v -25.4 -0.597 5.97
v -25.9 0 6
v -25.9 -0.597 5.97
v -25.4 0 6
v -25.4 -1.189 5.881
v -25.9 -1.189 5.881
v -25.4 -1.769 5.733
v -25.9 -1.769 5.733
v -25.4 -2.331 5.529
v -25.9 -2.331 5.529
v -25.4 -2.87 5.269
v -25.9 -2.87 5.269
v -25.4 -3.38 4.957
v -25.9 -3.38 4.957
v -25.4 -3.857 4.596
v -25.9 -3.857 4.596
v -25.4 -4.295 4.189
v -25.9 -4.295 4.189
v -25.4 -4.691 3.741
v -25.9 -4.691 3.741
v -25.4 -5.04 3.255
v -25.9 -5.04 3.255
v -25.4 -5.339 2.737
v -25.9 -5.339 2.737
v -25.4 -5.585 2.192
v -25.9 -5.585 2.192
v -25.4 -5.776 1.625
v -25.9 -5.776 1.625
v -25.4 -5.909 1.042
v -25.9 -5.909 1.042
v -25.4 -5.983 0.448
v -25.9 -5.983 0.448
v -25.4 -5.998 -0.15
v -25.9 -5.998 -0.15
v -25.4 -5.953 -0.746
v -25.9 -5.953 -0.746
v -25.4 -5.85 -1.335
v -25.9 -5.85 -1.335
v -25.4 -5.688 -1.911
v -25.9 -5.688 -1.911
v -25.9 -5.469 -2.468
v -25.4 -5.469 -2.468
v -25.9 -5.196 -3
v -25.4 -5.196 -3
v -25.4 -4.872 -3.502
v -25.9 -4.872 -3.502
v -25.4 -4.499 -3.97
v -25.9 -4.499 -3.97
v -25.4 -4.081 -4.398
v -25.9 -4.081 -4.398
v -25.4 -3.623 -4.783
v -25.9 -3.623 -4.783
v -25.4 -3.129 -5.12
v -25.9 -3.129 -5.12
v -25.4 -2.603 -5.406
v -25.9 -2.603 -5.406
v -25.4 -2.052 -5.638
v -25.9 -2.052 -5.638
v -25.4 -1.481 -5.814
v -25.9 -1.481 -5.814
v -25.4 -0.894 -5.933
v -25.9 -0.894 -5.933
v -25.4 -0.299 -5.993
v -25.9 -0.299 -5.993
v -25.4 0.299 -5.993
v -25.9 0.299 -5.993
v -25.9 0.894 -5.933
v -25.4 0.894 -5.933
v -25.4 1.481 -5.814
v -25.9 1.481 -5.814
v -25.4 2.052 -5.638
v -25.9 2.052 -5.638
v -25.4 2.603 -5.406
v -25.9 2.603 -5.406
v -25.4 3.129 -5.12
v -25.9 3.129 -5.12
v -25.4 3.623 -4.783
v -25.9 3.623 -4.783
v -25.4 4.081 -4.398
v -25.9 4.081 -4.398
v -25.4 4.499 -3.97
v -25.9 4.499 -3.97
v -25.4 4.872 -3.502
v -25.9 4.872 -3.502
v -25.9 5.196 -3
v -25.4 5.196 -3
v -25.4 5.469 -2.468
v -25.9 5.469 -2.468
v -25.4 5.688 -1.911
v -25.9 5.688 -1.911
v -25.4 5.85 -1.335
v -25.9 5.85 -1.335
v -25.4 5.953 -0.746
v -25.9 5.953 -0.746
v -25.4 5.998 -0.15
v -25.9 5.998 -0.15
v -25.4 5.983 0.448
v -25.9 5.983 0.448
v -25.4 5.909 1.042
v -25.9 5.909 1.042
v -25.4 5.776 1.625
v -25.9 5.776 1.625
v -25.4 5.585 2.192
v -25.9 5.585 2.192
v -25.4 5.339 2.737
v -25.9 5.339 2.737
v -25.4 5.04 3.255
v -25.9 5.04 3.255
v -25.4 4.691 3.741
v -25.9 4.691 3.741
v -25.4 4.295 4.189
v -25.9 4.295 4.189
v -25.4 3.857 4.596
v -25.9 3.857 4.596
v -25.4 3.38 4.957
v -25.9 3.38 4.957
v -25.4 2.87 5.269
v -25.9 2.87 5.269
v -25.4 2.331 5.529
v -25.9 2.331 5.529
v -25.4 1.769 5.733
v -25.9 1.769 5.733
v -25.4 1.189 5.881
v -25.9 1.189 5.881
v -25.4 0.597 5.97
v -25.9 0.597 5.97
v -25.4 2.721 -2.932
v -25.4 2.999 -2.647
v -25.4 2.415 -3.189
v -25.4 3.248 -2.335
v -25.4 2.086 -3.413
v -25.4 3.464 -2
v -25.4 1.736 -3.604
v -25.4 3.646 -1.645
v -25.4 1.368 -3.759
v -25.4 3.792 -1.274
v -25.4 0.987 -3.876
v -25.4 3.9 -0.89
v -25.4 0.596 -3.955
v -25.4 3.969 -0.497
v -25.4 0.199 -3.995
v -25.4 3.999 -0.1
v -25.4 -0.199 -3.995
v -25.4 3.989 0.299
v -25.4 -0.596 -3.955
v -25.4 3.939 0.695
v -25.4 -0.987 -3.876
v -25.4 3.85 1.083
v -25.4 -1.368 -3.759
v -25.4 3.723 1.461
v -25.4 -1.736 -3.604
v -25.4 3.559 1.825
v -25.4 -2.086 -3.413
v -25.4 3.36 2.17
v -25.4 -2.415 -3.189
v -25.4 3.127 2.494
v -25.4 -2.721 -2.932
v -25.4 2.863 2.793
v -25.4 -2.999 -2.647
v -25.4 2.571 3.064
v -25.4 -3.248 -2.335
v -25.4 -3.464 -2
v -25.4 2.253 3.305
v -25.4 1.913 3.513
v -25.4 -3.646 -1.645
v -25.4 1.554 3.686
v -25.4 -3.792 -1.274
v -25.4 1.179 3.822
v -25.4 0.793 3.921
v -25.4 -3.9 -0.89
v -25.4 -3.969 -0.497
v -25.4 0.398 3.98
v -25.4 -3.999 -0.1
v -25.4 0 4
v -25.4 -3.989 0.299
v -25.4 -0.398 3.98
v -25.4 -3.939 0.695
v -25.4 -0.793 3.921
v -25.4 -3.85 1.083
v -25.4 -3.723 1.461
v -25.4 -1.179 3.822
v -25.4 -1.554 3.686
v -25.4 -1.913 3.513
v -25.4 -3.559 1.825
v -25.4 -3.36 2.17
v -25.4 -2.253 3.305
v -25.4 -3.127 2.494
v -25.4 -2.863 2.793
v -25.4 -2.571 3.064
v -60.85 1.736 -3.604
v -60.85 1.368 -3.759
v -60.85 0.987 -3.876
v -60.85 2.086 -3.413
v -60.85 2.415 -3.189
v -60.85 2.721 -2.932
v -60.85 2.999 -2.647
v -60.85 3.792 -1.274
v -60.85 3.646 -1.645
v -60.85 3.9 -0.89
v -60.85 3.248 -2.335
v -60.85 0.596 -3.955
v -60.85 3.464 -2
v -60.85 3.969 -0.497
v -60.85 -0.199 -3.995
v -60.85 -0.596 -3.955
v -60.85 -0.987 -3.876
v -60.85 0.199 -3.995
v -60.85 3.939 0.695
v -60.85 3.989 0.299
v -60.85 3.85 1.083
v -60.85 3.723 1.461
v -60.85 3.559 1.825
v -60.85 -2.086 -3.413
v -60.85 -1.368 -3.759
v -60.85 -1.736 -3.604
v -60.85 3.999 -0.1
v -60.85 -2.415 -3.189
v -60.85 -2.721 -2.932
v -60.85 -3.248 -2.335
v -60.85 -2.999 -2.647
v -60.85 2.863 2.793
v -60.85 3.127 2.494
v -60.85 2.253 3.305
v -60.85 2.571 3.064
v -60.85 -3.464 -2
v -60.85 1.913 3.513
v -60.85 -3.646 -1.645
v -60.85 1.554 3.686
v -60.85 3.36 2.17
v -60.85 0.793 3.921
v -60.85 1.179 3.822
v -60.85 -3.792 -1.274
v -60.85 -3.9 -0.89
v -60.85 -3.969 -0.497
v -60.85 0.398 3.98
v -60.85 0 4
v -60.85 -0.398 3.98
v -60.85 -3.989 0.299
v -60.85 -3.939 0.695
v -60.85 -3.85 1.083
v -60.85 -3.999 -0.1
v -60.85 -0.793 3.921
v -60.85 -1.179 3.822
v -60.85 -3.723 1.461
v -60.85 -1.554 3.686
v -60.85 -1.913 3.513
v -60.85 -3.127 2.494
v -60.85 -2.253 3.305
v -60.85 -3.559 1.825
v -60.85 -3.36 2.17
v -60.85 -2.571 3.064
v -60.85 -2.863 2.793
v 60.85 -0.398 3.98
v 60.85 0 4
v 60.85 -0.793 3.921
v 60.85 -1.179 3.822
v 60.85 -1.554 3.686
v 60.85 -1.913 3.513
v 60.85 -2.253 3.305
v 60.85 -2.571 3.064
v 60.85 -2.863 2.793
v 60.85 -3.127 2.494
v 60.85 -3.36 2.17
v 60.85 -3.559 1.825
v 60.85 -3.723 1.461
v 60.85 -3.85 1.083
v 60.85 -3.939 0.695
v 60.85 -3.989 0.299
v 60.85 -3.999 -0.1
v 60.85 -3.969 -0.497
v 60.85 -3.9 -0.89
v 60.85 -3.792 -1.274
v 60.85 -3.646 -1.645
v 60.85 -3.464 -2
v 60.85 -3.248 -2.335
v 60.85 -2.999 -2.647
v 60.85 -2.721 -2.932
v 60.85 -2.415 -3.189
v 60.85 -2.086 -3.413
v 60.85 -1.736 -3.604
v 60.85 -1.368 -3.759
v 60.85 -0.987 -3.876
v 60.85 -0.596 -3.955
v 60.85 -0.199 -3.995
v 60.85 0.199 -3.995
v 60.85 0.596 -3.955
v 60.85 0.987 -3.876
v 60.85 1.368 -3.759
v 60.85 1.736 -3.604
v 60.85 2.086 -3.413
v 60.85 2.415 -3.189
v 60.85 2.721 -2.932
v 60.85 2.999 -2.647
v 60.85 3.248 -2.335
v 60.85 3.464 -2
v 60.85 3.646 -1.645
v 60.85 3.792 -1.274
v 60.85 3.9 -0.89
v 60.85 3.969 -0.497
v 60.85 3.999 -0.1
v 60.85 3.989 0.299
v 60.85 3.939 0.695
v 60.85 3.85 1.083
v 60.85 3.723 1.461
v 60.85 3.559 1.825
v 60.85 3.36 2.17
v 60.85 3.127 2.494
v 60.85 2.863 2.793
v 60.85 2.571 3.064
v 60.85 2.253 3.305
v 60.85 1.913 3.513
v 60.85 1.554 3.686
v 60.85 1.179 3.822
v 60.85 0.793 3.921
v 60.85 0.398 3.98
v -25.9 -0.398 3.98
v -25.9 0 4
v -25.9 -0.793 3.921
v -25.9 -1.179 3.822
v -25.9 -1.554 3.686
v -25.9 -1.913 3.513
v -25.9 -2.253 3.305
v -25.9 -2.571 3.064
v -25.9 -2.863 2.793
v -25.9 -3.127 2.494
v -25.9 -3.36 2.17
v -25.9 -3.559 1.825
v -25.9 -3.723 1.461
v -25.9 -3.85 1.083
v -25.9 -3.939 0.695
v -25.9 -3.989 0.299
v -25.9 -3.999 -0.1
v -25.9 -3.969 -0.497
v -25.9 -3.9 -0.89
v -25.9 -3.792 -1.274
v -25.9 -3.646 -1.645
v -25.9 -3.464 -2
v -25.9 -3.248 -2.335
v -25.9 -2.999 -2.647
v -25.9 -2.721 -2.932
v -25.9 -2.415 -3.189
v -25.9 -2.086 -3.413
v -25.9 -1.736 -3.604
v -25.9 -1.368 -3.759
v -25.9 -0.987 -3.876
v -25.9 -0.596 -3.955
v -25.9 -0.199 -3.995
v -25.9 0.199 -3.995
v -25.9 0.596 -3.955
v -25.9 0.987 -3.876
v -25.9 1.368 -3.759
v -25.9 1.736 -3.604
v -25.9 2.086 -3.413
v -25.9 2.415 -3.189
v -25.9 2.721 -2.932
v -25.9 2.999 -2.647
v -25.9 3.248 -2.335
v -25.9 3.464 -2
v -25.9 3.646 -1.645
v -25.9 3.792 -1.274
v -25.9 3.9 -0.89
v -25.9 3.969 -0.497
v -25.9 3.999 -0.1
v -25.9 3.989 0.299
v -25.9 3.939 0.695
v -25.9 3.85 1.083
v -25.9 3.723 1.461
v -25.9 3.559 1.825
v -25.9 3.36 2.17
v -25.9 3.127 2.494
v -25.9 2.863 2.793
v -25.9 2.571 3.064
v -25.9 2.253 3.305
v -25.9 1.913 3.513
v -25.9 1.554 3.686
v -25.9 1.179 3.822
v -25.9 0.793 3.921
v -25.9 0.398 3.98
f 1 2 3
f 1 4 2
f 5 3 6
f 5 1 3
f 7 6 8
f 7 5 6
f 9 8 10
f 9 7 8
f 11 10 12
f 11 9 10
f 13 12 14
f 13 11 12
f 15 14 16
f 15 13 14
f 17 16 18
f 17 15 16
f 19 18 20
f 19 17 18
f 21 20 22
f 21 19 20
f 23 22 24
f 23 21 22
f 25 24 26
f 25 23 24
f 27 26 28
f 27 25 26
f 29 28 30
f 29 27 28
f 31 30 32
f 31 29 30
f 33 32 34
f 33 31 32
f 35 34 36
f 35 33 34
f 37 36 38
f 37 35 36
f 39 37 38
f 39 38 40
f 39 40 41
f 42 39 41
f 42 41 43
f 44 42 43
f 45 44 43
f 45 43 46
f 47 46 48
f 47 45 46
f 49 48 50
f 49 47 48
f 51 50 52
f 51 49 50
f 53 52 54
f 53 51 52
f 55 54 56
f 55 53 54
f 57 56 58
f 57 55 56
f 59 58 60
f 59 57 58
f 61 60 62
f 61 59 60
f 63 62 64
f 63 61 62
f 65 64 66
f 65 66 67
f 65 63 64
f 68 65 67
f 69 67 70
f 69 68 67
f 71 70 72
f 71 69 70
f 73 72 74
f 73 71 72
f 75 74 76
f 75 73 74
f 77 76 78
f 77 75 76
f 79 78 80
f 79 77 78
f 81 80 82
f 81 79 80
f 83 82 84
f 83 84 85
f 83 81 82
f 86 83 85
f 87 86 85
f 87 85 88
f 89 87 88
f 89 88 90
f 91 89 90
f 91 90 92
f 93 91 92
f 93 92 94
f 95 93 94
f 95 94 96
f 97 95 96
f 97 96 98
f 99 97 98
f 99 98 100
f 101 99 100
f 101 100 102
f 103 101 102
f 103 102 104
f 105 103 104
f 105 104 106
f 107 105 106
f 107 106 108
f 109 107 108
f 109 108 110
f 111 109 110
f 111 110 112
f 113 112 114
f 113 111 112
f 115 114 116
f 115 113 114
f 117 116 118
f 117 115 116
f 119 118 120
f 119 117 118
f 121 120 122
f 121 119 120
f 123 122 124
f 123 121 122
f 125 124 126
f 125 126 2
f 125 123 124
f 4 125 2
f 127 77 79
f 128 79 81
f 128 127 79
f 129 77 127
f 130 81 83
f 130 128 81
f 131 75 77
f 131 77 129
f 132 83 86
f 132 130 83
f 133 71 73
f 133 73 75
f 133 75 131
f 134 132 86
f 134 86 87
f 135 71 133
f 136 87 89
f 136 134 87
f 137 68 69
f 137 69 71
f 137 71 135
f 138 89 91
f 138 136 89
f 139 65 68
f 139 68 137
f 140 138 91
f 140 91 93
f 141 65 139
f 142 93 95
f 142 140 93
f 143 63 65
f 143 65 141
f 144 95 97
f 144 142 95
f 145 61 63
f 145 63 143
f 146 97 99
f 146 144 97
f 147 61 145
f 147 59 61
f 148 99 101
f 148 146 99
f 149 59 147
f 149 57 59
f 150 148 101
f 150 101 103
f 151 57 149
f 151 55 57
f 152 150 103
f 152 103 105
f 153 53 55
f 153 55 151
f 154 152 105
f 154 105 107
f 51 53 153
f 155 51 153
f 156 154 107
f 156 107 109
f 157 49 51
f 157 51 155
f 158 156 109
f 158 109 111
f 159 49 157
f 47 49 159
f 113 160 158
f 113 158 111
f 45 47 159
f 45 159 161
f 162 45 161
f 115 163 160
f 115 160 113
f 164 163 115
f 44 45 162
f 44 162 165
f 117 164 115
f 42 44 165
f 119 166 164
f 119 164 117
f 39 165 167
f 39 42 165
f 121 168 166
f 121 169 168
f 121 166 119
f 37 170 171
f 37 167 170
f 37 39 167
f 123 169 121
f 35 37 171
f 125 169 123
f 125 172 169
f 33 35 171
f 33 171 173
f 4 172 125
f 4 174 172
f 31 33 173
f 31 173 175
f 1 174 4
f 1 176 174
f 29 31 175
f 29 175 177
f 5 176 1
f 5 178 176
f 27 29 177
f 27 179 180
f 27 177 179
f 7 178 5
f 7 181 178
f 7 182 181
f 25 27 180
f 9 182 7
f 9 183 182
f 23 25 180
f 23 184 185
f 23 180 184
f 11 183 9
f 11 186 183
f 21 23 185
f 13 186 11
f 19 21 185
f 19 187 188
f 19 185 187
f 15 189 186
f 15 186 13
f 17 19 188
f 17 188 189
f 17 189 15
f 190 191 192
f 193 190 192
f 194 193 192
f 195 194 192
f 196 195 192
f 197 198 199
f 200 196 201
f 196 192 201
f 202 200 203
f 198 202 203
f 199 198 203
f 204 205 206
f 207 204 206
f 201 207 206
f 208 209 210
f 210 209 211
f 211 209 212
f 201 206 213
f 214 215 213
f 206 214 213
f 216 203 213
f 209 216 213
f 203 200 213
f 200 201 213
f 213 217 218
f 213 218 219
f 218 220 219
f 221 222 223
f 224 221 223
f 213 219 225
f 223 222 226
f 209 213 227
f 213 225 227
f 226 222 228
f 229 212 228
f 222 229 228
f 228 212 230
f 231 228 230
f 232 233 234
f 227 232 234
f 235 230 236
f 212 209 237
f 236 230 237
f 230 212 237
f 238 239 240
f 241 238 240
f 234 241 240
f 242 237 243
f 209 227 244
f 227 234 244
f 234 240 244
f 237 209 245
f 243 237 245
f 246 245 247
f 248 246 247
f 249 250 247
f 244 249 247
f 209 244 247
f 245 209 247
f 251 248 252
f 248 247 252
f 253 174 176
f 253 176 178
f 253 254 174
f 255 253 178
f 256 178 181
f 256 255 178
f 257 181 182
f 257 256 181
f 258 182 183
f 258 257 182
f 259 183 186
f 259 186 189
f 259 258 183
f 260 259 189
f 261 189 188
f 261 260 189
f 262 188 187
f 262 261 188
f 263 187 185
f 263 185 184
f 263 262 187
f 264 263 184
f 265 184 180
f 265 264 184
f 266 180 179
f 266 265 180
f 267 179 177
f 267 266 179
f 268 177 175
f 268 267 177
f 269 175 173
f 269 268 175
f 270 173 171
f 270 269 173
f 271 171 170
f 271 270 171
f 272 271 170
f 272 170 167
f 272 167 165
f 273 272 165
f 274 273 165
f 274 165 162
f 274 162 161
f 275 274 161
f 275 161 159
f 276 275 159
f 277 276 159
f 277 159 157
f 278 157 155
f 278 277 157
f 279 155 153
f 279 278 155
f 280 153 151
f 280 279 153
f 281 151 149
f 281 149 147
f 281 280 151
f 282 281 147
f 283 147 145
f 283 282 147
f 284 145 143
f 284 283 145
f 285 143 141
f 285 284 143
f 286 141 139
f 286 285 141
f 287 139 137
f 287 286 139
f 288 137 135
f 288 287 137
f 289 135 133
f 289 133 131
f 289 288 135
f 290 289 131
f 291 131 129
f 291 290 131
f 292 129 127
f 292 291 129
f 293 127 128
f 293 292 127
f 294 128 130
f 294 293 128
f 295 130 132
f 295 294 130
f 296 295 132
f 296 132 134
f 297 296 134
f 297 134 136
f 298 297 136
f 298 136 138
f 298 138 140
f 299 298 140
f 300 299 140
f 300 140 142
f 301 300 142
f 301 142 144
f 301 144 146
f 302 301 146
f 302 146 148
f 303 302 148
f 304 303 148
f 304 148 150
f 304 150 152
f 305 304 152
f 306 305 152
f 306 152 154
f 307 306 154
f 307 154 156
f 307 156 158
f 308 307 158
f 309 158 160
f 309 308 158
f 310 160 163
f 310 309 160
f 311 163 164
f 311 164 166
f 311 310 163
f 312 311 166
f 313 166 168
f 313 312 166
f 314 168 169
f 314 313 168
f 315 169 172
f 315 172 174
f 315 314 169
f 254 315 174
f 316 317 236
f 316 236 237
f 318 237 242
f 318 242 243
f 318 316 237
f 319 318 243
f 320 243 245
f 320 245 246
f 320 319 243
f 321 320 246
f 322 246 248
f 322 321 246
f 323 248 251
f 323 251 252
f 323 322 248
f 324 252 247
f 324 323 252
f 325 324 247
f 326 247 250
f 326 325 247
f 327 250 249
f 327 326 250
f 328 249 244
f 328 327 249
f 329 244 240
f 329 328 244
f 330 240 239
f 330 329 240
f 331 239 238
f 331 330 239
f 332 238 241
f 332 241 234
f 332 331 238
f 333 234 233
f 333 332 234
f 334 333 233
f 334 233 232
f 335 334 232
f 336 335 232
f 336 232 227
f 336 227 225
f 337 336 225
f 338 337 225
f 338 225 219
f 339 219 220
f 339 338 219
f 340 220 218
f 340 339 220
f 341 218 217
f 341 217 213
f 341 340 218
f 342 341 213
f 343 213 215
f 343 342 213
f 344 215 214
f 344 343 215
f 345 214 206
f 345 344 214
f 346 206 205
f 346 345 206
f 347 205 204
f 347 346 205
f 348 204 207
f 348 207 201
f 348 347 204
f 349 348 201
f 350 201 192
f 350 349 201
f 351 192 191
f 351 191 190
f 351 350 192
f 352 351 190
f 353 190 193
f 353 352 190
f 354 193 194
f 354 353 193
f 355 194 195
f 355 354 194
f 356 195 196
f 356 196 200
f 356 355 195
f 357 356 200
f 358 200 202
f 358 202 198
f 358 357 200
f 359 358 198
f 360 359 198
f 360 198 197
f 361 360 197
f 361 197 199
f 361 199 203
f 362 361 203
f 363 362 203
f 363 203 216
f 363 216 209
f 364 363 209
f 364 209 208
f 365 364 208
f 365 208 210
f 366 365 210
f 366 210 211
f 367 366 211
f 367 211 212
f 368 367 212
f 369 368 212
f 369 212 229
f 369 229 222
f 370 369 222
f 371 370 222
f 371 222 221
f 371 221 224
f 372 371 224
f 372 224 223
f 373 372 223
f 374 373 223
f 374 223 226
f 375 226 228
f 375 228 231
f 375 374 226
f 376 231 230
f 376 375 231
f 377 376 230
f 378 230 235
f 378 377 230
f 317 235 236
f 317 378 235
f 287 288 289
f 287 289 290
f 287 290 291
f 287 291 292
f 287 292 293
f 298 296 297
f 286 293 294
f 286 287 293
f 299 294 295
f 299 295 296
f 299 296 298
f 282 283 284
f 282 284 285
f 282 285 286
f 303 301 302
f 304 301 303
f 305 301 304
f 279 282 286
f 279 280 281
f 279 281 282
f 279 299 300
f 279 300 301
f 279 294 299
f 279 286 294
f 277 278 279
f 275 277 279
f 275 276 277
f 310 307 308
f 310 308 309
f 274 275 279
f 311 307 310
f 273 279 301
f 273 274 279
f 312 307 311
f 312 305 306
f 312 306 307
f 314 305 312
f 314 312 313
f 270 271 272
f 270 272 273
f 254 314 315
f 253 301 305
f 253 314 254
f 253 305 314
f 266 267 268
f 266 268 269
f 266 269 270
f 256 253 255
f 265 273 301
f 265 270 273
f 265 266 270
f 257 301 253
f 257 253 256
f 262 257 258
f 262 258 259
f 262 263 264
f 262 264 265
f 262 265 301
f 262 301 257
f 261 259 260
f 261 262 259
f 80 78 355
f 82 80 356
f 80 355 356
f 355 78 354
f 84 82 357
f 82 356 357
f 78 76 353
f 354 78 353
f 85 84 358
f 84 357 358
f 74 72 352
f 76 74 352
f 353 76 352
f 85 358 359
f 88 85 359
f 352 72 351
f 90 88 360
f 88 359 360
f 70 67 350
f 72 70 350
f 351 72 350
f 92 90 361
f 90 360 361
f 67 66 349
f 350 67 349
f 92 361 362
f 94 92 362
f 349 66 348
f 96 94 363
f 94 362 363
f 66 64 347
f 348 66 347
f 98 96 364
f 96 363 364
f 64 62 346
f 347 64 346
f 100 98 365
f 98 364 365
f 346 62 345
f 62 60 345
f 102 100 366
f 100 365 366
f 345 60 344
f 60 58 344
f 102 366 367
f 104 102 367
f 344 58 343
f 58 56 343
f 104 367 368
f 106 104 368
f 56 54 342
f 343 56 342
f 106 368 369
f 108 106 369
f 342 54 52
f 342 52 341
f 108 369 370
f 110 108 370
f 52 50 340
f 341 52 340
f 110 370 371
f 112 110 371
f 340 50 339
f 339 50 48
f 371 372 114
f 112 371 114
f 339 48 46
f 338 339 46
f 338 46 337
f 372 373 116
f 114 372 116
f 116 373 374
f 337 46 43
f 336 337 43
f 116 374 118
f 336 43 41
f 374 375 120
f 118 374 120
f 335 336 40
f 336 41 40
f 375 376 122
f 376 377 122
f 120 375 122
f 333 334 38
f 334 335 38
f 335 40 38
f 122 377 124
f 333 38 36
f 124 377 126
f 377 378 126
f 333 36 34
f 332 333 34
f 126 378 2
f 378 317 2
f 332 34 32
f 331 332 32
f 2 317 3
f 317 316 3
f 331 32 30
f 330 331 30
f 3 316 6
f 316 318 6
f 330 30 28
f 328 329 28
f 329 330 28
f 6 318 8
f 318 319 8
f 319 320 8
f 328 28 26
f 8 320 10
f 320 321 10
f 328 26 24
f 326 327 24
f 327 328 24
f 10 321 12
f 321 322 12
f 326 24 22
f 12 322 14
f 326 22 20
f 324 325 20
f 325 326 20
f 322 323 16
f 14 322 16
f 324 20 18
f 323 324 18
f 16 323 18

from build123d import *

# Parameters (mm, degrees)
ESBO_O1_W = 121.7
ESBO_O1_H = 4
ESBO_O2_W = 0.5
ESBO_O2_H = 6


with BuildPart() as part:
    # Esboço1 → Revolução2 (revolve)
    with BuildSketch(Plane.XY, mode=Mode.PRIVATE) as revolu_o2_sk:
        with Locations((0, -2)):
            Rectangle(ESBO_O1_W, ESBO_O1_H)
    revolve(revolu_o2_sk.sketch.rotate(Axis((-60.85, 0, 0), (1, 0, 0)), 270), axis=Axis((-60.85, 0, 0), (1, 0, 0)))

    # Esboço2 → Revolução3 (revolve)
    with BuildSketch(Plane.XY, mode=Mode.PRIVATE) as revolu_o3_sk:
        with Locations((-25.65, -3)):
            Rectangle(ESBO_O2_W, ESBO_O2_H)
    revolve(revolu_o3_sk.sketch.rotate(Axis((-25.9, 0, 0), (1, 0, 0)), 270), axis=Axis((-25.9, 0, 0), (1, 0, 0)))


solid = part.part
